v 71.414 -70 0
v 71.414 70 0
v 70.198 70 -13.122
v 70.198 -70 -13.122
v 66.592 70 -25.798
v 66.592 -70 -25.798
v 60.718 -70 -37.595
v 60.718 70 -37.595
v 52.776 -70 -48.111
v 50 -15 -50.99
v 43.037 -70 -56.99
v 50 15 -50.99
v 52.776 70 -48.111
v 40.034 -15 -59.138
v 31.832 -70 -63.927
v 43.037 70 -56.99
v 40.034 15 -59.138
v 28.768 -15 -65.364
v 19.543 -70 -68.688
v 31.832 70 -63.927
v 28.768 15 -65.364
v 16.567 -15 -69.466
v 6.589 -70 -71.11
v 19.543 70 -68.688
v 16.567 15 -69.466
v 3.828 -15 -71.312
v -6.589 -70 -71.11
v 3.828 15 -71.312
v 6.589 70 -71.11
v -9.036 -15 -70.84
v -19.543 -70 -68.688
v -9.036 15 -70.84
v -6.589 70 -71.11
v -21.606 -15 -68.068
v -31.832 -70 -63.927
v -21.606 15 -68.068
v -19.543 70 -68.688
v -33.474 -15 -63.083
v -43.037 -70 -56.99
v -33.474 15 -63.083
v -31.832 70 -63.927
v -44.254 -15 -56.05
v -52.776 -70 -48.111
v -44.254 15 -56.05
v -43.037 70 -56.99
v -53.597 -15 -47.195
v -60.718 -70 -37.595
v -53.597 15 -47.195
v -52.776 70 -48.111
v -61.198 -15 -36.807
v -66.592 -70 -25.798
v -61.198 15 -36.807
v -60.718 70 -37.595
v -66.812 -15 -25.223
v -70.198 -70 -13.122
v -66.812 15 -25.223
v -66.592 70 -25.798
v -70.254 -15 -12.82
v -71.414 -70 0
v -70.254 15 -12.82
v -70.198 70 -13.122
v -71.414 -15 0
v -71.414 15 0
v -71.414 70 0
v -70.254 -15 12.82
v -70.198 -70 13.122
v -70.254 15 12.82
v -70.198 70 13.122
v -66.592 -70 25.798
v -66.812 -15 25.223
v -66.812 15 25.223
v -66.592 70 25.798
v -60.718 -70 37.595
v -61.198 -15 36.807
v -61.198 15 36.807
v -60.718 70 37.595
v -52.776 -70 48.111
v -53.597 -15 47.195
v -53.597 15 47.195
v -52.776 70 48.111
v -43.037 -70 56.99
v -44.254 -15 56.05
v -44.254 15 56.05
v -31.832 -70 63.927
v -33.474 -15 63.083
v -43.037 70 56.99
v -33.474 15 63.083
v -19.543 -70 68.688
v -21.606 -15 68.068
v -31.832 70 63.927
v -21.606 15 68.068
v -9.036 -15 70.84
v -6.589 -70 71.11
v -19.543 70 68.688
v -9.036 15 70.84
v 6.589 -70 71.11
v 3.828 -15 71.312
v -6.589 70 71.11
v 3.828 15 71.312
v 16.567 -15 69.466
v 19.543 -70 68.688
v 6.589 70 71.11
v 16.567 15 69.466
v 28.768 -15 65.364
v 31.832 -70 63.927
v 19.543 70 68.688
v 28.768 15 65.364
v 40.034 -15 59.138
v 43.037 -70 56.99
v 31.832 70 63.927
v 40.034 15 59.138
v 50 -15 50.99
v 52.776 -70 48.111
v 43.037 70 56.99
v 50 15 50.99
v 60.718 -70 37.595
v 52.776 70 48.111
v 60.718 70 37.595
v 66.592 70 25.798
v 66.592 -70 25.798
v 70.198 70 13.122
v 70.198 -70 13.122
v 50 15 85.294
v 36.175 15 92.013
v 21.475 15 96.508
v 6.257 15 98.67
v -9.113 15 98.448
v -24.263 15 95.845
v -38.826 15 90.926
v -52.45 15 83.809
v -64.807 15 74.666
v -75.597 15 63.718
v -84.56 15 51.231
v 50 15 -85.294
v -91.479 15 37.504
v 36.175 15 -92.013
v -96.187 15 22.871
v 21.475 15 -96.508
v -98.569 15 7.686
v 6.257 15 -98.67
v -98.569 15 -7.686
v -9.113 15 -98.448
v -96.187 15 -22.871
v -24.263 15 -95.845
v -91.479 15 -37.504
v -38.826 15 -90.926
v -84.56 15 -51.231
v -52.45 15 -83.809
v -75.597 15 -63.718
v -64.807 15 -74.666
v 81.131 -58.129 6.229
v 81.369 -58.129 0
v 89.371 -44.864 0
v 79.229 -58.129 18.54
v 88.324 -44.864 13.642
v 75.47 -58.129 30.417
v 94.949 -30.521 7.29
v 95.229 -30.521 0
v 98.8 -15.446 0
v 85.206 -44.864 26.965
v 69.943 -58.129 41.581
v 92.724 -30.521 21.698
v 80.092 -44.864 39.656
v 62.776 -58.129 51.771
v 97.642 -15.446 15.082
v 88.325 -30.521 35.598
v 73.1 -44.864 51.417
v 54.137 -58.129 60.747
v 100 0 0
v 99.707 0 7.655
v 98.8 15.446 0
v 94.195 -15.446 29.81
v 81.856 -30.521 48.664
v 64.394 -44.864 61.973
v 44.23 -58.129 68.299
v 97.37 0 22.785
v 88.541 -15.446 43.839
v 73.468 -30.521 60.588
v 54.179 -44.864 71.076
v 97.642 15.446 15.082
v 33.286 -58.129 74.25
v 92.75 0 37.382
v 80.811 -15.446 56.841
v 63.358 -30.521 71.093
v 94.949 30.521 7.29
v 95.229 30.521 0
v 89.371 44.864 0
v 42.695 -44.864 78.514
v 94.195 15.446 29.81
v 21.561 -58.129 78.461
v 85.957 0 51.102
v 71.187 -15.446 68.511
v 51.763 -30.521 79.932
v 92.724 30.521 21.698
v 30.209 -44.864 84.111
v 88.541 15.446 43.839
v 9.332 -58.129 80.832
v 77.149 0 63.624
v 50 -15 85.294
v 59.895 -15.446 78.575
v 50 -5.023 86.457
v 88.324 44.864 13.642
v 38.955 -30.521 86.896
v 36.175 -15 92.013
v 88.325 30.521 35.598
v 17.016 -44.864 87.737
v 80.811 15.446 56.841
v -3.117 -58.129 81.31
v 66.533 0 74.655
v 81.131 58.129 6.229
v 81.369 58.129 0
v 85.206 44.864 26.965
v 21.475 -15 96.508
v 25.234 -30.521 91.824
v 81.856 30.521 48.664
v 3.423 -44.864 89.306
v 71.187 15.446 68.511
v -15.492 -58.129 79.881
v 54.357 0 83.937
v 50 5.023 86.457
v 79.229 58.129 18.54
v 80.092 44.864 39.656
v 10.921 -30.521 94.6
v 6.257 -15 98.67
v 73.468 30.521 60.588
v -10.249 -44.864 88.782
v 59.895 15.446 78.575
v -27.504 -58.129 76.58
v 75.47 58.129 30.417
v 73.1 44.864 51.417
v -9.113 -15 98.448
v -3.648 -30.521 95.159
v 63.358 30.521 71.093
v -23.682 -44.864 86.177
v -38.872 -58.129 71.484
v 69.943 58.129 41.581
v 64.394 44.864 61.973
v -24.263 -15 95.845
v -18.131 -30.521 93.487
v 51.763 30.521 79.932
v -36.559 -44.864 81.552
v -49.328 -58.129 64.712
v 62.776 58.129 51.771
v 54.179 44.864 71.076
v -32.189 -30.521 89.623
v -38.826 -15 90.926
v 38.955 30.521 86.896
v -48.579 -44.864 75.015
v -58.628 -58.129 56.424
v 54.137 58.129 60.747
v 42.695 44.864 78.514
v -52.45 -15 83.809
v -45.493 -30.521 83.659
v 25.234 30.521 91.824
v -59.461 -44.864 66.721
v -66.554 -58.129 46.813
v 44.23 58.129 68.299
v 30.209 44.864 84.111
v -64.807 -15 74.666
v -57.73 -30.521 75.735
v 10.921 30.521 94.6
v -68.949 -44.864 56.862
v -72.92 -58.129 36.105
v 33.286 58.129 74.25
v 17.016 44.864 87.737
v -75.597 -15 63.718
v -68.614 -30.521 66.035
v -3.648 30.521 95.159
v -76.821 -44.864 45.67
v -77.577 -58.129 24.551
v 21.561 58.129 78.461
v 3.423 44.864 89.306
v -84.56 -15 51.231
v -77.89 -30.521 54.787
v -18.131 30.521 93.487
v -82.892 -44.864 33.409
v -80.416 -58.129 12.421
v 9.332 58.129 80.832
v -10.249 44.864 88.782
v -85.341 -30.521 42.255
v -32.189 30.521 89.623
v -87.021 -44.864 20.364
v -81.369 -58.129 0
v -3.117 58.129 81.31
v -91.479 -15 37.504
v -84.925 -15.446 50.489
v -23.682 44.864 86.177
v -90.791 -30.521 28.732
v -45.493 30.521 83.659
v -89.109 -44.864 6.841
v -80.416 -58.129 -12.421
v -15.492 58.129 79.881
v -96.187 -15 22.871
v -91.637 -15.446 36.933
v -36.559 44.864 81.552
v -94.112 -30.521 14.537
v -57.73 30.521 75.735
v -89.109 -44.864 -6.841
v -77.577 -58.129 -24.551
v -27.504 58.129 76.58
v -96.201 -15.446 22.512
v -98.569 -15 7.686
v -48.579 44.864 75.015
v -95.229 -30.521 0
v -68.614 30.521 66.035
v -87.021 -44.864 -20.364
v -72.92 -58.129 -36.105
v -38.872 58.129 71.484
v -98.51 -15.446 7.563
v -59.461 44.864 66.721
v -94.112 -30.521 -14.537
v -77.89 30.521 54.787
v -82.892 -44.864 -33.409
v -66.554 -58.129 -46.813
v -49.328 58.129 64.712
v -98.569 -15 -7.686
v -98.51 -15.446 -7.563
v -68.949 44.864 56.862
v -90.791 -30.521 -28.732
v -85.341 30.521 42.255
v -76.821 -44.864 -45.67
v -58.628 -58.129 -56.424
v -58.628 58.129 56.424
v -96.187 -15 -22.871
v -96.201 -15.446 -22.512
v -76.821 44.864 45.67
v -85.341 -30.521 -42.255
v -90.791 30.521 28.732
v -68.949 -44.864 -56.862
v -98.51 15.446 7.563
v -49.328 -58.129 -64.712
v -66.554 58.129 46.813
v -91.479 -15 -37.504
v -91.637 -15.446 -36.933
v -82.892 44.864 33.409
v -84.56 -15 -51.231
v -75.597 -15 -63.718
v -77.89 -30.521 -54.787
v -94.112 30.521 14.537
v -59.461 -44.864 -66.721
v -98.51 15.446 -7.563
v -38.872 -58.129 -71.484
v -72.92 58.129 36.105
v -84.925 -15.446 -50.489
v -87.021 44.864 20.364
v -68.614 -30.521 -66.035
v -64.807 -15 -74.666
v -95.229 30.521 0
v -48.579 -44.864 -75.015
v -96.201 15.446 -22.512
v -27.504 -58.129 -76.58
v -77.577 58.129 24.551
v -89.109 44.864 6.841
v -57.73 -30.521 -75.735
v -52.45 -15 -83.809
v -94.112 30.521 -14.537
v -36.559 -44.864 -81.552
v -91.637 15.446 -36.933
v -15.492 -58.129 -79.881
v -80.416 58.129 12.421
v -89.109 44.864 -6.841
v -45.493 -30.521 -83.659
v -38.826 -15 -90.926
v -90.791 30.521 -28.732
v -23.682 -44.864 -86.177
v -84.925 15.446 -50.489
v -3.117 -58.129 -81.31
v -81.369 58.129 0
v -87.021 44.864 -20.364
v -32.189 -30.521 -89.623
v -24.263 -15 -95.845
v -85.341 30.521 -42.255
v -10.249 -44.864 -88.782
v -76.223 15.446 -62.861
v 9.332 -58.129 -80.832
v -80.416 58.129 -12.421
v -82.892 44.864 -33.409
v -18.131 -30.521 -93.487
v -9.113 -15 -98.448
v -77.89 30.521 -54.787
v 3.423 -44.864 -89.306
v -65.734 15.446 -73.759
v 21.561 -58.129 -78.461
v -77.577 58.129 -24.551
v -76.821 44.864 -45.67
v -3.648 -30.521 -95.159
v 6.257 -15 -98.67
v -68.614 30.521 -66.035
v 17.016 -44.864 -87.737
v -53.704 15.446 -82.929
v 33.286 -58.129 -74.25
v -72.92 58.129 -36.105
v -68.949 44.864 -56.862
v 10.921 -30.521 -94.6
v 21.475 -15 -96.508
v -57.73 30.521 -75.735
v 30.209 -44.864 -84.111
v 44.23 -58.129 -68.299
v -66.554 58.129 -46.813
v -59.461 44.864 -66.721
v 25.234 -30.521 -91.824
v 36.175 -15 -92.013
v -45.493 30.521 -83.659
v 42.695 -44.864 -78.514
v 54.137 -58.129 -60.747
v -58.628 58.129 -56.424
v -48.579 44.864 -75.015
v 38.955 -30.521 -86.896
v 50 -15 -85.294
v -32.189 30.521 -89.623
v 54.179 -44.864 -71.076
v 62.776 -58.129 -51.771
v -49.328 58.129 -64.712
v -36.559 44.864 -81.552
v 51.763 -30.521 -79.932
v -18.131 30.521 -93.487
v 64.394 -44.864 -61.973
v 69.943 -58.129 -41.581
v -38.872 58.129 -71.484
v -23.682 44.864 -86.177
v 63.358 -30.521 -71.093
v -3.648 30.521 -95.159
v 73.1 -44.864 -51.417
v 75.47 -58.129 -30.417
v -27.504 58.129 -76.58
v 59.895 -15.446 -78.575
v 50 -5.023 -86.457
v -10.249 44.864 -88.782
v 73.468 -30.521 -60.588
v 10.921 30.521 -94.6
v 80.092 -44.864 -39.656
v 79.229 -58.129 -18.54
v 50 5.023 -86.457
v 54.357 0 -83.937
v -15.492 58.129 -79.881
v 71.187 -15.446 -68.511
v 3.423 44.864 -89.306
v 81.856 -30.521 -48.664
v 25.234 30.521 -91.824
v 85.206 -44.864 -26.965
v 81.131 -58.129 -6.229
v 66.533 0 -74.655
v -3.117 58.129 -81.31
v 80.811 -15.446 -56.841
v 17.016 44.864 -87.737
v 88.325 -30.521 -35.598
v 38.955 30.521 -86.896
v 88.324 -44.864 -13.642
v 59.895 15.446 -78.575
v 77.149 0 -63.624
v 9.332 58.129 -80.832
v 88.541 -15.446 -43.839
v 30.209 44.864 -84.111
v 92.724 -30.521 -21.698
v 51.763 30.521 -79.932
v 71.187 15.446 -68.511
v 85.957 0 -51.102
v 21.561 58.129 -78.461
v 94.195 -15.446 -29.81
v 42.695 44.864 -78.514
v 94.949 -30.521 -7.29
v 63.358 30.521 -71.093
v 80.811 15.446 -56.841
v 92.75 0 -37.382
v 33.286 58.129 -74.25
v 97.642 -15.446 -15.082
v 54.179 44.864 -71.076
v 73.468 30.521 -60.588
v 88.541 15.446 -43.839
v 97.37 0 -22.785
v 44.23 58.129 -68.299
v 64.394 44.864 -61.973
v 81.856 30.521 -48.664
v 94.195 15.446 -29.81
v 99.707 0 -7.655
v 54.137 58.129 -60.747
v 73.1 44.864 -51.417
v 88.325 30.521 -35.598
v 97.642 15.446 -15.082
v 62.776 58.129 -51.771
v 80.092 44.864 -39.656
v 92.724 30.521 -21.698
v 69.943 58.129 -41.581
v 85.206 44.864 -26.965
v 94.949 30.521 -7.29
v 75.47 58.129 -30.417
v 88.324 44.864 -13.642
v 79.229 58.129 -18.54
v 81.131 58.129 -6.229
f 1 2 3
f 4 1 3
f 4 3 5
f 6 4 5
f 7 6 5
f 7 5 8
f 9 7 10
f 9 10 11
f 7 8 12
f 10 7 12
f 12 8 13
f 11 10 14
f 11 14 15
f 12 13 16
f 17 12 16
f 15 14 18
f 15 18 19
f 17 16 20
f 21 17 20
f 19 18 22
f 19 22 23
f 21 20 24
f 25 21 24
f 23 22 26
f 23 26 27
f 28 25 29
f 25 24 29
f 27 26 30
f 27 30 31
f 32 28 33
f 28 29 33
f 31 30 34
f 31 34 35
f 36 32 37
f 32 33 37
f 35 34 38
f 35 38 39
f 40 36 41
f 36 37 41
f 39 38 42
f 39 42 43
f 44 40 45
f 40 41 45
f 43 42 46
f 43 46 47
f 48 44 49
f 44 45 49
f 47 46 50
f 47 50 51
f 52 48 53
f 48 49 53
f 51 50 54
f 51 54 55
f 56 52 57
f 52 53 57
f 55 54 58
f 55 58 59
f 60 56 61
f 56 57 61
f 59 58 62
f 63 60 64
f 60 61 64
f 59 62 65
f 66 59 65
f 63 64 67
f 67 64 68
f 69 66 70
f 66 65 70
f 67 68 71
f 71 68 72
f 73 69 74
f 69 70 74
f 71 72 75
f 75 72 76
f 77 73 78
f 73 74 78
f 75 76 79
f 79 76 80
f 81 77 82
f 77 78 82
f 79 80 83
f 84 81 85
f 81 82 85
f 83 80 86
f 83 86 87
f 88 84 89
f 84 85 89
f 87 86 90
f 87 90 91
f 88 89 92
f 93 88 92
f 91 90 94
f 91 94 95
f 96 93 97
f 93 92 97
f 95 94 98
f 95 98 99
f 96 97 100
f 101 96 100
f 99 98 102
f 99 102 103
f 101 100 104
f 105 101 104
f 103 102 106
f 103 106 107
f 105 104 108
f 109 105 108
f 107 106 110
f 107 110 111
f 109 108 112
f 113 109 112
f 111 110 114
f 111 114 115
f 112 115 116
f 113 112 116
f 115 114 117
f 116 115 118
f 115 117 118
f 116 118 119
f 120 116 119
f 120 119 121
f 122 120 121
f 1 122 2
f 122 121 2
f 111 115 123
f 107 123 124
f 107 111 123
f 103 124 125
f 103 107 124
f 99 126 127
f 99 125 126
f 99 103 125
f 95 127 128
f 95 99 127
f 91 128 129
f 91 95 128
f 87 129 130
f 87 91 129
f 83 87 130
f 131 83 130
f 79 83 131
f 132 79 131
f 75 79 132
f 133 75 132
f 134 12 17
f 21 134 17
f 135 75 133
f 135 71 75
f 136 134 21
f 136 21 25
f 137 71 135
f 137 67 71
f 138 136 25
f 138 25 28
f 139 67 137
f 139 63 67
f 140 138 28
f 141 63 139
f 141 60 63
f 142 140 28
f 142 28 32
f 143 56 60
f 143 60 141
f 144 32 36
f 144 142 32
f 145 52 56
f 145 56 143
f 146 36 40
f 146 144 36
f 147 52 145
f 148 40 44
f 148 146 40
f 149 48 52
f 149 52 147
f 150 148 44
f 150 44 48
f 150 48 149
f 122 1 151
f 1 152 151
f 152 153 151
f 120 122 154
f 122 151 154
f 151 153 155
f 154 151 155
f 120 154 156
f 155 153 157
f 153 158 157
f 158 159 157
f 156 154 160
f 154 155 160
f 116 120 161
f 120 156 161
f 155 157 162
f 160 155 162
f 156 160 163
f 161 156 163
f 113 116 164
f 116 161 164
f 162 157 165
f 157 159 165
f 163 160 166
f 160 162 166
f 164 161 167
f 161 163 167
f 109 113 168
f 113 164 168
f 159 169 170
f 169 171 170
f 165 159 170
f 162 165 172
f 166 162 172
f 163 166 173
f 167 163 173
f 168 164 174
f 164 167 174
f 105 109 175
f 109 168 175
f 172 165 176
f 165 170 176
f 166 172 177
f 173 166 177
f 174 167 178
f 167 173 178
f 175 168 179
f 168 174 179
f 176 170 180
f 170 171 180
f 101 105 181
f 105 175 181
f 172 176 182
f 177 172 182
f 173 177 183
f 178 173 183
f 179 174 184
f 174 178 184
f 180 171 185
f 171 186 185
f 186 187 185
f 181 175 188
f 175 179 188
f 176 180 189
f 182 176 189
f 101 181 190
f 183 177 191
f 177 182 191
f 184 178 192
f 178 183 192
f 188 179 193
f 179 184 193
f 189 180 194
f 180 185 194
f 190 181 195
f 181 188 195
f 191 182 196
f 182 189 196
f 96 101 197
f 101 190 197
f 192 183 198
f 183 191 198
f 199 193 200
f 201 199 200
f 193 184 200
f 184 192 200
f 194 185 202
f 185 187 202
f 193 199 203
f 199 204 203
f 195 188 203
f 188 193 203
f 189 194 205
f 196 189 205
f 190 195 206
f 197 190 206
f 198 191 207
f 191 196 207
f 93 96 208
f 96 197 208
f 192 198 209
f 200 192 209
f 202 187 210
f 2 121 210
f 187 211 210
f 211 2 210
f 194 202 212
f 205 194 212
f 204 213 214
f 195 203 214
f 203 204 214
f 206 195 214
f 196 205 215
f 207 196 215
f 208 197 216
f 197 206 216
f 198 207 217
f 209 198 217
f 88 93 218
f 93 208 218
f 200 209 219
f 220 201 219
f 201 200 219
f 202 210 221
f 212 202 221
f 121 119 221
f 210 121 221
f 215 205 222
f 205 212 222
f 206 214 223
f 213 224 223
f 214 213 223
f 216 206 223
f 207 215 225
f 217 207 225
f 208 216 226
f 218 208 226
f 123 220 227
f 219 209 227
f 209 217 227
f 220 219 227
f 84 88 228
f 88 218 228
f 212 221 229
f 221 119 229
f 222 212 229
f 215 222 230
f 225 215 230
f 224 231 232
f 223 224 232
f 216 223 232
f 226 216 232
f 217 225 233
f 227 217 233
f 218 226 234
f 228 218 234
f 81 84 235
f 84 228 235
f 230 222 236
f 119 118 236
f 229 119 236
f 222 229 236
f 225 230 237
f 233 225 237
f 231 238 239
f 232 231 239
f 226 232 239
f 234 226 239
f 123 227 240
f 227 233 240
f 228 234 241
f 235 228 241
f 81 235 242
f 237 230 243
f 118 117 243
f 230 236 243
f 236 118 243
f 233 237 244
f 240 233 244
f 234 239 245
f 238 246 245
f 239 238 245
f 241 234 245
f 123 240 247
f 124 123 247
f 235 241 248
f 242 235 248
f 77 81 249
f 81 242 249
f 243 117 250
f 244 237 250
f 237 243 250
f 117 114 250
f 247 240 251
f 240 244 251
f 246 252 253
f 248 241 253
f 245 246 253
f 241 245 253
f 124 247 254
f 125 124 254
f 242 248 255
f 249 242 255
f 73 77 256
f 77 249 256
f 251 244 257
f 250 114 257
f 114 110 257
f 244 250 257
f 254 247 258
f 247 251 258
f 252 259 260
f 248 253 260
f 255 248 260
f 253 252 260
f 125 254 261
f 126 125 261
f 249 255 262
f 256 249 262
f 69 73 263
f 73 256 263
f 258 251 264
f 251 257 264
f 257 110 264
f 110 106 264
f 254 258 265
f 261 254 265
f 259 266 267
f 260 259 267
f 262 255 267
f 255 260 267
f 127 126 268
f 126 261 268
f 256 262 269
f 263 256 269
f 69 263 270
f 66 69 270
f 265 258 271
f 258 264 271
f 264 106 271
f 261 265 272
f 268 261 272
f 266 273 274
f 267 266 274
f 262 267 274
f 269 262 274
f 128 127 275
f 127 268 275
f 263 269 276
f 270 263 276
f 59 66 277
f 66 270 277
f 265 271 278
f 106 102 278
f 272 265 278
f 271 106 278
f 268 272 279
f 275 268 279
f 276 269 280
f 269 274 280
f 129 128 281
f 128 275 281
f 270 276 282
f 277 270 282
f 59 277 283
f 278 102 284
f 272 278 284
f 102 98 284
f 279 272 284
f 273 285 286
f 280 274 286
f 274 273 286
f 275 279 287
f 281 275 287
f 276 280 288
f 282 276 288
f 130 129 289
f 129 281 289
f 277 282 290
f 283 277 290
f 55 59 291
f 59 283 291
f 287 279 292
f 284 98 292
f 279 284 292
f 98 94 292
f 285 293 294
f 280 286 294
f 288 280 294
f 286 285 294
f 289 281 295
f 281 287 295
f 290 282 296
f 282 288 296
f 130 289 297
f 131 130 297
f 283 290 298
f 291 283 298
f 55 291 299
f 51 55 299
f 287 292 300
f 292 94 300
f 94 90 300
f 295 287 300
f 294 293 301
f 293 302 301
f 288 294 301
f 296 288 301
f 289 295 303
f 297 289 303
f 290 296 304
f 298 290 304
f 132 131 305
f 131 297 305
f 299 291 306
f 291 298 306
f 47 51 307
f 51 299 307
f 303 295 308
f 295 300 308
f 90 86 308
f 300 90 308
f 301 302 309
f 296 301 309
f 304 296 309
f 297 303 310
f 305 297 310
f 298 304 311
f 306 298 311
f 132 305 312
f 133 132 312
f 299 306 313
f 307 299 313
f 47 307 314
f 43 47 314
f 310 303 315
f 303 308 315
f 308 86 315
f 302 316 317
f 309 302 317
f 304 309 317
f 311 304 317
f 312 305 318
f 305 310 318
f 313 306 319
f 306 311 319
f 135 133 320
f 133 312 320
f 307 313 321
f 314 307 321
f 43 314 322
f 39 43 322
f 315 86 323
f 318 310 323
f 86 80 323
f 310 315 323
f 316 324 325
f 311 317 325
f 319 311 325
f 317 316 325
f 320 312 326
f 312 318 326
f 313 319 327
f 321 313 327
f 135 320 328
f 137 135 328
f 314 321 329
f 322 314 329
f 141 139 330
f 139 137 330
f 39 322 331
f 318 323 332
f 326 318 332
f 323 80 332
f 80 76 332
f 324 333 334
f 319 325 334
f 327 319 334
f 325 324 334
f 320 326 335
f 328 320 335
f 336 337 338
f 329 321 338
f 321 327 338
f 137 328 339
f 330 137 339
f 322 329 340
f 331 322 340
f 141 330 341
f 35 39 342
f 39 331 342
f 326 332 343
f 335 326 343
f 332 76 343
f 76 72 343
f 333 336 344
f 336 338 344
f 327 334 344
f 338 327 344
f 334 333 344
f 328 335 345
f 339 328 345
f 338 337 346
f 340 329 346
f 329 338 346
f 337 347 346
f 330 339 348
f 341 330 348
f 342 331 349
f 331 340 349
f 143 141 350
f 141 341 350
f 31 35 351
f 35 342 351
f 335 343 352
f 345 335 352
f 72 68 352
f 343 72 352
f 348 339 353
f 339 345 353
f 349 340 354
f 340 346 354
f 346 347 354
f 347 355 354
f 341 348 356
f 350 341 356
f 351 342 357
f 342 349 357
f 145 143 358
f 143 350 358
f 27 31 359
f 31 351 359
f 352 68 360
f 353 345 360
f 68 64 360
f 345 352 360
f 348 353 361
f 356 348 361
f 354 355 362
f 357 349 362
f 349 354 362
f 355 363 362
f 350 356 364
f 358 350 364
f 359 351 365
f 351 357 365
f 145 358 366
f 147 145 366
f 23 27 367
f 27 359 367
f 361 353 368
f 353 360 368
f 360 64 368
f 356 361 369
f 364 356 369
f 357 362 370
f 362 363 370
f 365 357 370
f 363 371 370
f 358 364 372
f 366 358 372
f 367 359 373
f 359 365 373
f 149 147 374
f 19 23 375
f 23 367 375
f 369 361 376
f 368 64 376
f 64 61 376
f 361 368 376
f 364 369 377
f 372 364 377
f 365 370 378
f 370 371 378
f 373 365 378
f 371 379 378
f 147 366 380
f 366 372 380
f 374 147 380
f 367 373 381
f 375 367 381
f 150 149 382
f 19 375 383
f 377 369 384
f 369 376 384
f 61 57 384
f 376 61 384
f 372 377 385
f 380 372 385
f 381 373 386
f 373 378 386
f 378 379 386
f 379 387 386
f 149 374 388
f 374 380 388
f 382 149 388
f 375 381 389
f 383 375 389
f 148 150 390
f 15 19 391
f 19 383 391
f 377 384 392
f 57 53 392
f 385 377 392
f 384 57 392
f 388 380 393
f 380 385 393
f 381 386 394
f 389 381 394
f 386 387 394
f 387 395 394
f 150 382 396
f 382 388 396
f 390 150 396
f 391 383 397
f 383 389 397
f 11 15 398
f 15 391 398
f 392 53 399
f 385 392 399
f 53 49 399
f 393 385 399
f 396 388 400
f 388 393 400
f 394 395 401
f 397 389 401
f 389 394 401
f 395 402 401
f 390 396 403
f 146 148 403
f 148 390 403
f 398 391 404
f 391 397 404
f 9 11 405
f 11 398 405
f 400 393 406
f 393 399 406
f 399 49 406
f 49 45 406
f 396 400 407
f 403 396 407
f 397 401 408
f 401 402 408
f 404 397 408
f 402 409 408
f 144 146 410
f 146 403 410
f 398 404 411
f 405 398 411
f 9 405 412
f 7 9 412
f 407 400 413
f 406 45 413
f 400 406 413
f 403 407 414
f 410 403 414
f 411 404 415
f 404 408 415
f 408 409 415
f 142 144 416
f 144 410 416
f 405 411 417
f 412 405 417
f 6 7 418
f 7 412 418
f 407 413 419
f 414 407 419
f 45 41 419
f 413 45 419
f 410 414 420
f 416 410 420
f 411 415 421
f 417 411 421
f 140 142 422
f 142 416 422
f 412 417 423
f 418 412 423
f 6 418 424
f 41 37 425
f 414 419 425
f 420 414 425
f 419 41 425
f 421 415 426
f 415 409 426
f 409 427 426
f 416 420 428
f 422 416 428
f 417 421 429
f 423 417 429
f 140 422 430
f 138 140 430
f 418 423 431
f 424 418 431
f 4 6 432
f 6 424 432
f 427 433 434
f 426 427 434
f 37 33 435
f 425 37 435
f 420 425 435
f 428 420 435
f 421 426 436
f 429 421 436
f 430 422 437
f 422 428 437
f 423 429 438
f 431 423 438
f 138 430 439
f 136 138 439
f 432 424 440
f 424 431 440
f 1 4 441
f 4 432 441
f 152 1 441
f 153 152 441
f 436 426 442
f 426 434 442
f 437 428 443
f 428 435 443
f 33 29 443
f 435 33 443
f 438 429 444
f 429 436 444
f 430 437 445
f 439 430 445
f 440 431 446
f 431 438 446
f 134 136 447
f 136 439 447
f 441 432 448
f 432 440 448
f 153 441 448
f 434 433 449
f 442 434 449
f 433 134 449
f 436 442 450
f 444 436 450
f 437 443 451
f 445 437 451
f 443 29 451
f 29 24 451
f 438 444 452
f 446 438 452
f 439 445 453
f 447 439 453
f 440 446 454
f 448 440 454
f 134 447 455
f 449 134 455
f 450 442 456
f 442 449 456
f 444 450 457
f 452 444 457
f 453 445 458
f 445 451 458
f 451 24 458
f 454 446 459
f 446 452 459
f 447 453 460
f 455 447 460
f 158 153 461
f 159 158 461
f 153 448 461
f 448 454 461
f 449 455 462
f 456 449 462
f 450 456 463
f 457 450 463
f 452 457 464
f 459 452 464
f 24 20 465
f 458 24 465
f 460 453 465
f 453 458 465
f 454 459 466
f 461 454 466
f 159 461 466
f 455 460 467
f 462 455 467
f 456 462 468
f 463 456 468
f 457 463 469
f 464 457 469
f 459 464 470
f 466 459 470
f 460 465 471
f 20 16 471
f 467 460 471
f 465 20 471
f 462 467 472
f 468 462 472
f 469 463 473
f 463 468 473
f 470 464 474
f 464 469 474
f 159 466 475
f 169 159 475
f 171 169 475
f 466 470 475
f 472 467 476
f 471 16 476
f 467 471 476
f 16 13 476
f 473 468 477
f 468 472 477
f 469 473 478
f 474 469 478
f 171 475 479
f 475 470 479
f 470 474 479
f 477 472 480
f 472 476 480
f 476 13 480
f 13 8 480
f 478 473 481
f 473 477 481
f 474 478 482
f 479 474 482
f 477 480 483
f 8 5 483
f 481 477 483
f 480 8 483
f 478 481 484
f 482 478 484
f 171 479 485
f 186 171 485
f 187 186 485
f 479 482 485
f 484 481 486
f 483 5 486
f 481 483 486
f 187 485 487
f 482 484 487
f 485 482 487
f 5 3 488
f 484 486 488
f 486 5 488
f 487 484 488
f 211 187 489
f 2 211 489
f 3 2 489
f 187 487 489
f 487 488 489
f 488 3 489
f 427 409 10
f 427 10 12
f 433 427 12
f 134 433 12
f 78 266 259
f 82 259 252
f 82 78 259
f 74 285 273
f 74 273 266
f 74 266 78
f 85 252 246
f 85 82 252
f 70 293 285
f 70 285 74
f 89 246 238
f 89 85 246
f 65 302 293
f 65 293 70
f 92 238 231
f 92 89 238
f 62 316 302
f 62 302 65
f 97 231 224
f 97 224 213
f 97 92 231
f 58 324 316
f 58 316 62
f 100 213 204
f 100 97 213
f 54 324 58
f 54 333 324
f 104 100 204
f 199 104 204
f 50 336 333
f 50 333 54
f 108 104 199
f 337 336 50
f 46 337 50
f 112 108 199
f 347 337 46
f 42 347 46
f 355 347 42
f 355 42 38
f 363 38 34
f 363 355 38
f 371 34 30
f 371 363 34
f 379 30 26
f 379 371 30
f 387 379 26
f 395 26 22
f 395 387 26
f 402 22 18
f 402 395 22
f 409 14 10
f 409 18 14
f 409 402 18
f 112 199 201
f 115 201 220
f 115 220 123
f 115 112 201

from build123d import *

# Parameters (mm, degrees)
CROQUIS3_W                 = 20
CROQUIS3_H                 = 6
CROQUIS4_W                 = 20
CROQUIS4_H                 = 6
CROQUIS8_R                 = 14.282856857
CORTAR_EXTRUIR2_DEPTH      = 40.799497484
CORTAR_EXTRUIR3_DEPTH      = 34
CORTAR_EXTRUIR3_DEPTH_BACK = 34
ESCALA1_SCALE              = 5


with BuildPart() as part:
    # Croquis1 → Revolución1 (revolve)
    with BuildSketch(Plane.XY):
        with BuildLine():
            Line((0, 20), (0, -20))
            ThreePointArc((0, -20), (20, 0), (0, 20))
        make_face()
    revolve(axis=Axis((0, 27.452088109, 0), (0, -1, 0)))

    # Croquis3 → Cortar-Revolución1 (revolve, cut)
    with BuildSketch(Plane.XY):
        with Locations((-10, 17)):
            Rectangle(CROQUIS3_W, CROQUIS3_H)
    revolve(axis=Axis((0, 20, 0), (0, -1, 0)), mode=Mode.SUBTRACT)

    # Croquis4 → Cortar-Revolución2 (revolve, cut)
    with BuildSketch(Plane.XY):
        with Locations((10, -17)):
            Rectangle(CROQUIS4_W, CROQUIS4_H)
    revolve(axis=Axis((0, 0, 0), (0, -1, 0)), mode=Mode.SUBTRACT)

    # Croquis8 → Cortar-Extruir2 (cut, through all)
    with BuildSketch(Plane(origin=(0, 14, 0), x_dir=(1, 0, 0), z_dir=(0, 1, 0))):
        Circle(CROQUIS8_R)
    extrude(amount=-CORTAR_EXTRUIR2_DEPTH, mode=Mode.SUBTRACT)

    # Croquis9 → Cortar-Extruir3 (cut, two sides: drawn at the far end of the back side and taken through both)
    with BuildSketch(Plane.XY.offset(-CORTAR_EXTRUIR3_DEPTH_BACK)):
        Polygon((-20, -3), (10, -3), (10, 0), (10, 3), (-20, 3), align=None)
    extrude(amount=CORTAR_EXTRUIR3_DEPTH + CORTAR_EXTRUIR3_DEPTH_BACK, mode=Mode.SUBTRACT)


with BuildPart() as part_1:
    # Escala1: scaled about (0, 0, 0)
    add(part.part.scale(ESCALA1_SCALE))


solid = part_1.part
